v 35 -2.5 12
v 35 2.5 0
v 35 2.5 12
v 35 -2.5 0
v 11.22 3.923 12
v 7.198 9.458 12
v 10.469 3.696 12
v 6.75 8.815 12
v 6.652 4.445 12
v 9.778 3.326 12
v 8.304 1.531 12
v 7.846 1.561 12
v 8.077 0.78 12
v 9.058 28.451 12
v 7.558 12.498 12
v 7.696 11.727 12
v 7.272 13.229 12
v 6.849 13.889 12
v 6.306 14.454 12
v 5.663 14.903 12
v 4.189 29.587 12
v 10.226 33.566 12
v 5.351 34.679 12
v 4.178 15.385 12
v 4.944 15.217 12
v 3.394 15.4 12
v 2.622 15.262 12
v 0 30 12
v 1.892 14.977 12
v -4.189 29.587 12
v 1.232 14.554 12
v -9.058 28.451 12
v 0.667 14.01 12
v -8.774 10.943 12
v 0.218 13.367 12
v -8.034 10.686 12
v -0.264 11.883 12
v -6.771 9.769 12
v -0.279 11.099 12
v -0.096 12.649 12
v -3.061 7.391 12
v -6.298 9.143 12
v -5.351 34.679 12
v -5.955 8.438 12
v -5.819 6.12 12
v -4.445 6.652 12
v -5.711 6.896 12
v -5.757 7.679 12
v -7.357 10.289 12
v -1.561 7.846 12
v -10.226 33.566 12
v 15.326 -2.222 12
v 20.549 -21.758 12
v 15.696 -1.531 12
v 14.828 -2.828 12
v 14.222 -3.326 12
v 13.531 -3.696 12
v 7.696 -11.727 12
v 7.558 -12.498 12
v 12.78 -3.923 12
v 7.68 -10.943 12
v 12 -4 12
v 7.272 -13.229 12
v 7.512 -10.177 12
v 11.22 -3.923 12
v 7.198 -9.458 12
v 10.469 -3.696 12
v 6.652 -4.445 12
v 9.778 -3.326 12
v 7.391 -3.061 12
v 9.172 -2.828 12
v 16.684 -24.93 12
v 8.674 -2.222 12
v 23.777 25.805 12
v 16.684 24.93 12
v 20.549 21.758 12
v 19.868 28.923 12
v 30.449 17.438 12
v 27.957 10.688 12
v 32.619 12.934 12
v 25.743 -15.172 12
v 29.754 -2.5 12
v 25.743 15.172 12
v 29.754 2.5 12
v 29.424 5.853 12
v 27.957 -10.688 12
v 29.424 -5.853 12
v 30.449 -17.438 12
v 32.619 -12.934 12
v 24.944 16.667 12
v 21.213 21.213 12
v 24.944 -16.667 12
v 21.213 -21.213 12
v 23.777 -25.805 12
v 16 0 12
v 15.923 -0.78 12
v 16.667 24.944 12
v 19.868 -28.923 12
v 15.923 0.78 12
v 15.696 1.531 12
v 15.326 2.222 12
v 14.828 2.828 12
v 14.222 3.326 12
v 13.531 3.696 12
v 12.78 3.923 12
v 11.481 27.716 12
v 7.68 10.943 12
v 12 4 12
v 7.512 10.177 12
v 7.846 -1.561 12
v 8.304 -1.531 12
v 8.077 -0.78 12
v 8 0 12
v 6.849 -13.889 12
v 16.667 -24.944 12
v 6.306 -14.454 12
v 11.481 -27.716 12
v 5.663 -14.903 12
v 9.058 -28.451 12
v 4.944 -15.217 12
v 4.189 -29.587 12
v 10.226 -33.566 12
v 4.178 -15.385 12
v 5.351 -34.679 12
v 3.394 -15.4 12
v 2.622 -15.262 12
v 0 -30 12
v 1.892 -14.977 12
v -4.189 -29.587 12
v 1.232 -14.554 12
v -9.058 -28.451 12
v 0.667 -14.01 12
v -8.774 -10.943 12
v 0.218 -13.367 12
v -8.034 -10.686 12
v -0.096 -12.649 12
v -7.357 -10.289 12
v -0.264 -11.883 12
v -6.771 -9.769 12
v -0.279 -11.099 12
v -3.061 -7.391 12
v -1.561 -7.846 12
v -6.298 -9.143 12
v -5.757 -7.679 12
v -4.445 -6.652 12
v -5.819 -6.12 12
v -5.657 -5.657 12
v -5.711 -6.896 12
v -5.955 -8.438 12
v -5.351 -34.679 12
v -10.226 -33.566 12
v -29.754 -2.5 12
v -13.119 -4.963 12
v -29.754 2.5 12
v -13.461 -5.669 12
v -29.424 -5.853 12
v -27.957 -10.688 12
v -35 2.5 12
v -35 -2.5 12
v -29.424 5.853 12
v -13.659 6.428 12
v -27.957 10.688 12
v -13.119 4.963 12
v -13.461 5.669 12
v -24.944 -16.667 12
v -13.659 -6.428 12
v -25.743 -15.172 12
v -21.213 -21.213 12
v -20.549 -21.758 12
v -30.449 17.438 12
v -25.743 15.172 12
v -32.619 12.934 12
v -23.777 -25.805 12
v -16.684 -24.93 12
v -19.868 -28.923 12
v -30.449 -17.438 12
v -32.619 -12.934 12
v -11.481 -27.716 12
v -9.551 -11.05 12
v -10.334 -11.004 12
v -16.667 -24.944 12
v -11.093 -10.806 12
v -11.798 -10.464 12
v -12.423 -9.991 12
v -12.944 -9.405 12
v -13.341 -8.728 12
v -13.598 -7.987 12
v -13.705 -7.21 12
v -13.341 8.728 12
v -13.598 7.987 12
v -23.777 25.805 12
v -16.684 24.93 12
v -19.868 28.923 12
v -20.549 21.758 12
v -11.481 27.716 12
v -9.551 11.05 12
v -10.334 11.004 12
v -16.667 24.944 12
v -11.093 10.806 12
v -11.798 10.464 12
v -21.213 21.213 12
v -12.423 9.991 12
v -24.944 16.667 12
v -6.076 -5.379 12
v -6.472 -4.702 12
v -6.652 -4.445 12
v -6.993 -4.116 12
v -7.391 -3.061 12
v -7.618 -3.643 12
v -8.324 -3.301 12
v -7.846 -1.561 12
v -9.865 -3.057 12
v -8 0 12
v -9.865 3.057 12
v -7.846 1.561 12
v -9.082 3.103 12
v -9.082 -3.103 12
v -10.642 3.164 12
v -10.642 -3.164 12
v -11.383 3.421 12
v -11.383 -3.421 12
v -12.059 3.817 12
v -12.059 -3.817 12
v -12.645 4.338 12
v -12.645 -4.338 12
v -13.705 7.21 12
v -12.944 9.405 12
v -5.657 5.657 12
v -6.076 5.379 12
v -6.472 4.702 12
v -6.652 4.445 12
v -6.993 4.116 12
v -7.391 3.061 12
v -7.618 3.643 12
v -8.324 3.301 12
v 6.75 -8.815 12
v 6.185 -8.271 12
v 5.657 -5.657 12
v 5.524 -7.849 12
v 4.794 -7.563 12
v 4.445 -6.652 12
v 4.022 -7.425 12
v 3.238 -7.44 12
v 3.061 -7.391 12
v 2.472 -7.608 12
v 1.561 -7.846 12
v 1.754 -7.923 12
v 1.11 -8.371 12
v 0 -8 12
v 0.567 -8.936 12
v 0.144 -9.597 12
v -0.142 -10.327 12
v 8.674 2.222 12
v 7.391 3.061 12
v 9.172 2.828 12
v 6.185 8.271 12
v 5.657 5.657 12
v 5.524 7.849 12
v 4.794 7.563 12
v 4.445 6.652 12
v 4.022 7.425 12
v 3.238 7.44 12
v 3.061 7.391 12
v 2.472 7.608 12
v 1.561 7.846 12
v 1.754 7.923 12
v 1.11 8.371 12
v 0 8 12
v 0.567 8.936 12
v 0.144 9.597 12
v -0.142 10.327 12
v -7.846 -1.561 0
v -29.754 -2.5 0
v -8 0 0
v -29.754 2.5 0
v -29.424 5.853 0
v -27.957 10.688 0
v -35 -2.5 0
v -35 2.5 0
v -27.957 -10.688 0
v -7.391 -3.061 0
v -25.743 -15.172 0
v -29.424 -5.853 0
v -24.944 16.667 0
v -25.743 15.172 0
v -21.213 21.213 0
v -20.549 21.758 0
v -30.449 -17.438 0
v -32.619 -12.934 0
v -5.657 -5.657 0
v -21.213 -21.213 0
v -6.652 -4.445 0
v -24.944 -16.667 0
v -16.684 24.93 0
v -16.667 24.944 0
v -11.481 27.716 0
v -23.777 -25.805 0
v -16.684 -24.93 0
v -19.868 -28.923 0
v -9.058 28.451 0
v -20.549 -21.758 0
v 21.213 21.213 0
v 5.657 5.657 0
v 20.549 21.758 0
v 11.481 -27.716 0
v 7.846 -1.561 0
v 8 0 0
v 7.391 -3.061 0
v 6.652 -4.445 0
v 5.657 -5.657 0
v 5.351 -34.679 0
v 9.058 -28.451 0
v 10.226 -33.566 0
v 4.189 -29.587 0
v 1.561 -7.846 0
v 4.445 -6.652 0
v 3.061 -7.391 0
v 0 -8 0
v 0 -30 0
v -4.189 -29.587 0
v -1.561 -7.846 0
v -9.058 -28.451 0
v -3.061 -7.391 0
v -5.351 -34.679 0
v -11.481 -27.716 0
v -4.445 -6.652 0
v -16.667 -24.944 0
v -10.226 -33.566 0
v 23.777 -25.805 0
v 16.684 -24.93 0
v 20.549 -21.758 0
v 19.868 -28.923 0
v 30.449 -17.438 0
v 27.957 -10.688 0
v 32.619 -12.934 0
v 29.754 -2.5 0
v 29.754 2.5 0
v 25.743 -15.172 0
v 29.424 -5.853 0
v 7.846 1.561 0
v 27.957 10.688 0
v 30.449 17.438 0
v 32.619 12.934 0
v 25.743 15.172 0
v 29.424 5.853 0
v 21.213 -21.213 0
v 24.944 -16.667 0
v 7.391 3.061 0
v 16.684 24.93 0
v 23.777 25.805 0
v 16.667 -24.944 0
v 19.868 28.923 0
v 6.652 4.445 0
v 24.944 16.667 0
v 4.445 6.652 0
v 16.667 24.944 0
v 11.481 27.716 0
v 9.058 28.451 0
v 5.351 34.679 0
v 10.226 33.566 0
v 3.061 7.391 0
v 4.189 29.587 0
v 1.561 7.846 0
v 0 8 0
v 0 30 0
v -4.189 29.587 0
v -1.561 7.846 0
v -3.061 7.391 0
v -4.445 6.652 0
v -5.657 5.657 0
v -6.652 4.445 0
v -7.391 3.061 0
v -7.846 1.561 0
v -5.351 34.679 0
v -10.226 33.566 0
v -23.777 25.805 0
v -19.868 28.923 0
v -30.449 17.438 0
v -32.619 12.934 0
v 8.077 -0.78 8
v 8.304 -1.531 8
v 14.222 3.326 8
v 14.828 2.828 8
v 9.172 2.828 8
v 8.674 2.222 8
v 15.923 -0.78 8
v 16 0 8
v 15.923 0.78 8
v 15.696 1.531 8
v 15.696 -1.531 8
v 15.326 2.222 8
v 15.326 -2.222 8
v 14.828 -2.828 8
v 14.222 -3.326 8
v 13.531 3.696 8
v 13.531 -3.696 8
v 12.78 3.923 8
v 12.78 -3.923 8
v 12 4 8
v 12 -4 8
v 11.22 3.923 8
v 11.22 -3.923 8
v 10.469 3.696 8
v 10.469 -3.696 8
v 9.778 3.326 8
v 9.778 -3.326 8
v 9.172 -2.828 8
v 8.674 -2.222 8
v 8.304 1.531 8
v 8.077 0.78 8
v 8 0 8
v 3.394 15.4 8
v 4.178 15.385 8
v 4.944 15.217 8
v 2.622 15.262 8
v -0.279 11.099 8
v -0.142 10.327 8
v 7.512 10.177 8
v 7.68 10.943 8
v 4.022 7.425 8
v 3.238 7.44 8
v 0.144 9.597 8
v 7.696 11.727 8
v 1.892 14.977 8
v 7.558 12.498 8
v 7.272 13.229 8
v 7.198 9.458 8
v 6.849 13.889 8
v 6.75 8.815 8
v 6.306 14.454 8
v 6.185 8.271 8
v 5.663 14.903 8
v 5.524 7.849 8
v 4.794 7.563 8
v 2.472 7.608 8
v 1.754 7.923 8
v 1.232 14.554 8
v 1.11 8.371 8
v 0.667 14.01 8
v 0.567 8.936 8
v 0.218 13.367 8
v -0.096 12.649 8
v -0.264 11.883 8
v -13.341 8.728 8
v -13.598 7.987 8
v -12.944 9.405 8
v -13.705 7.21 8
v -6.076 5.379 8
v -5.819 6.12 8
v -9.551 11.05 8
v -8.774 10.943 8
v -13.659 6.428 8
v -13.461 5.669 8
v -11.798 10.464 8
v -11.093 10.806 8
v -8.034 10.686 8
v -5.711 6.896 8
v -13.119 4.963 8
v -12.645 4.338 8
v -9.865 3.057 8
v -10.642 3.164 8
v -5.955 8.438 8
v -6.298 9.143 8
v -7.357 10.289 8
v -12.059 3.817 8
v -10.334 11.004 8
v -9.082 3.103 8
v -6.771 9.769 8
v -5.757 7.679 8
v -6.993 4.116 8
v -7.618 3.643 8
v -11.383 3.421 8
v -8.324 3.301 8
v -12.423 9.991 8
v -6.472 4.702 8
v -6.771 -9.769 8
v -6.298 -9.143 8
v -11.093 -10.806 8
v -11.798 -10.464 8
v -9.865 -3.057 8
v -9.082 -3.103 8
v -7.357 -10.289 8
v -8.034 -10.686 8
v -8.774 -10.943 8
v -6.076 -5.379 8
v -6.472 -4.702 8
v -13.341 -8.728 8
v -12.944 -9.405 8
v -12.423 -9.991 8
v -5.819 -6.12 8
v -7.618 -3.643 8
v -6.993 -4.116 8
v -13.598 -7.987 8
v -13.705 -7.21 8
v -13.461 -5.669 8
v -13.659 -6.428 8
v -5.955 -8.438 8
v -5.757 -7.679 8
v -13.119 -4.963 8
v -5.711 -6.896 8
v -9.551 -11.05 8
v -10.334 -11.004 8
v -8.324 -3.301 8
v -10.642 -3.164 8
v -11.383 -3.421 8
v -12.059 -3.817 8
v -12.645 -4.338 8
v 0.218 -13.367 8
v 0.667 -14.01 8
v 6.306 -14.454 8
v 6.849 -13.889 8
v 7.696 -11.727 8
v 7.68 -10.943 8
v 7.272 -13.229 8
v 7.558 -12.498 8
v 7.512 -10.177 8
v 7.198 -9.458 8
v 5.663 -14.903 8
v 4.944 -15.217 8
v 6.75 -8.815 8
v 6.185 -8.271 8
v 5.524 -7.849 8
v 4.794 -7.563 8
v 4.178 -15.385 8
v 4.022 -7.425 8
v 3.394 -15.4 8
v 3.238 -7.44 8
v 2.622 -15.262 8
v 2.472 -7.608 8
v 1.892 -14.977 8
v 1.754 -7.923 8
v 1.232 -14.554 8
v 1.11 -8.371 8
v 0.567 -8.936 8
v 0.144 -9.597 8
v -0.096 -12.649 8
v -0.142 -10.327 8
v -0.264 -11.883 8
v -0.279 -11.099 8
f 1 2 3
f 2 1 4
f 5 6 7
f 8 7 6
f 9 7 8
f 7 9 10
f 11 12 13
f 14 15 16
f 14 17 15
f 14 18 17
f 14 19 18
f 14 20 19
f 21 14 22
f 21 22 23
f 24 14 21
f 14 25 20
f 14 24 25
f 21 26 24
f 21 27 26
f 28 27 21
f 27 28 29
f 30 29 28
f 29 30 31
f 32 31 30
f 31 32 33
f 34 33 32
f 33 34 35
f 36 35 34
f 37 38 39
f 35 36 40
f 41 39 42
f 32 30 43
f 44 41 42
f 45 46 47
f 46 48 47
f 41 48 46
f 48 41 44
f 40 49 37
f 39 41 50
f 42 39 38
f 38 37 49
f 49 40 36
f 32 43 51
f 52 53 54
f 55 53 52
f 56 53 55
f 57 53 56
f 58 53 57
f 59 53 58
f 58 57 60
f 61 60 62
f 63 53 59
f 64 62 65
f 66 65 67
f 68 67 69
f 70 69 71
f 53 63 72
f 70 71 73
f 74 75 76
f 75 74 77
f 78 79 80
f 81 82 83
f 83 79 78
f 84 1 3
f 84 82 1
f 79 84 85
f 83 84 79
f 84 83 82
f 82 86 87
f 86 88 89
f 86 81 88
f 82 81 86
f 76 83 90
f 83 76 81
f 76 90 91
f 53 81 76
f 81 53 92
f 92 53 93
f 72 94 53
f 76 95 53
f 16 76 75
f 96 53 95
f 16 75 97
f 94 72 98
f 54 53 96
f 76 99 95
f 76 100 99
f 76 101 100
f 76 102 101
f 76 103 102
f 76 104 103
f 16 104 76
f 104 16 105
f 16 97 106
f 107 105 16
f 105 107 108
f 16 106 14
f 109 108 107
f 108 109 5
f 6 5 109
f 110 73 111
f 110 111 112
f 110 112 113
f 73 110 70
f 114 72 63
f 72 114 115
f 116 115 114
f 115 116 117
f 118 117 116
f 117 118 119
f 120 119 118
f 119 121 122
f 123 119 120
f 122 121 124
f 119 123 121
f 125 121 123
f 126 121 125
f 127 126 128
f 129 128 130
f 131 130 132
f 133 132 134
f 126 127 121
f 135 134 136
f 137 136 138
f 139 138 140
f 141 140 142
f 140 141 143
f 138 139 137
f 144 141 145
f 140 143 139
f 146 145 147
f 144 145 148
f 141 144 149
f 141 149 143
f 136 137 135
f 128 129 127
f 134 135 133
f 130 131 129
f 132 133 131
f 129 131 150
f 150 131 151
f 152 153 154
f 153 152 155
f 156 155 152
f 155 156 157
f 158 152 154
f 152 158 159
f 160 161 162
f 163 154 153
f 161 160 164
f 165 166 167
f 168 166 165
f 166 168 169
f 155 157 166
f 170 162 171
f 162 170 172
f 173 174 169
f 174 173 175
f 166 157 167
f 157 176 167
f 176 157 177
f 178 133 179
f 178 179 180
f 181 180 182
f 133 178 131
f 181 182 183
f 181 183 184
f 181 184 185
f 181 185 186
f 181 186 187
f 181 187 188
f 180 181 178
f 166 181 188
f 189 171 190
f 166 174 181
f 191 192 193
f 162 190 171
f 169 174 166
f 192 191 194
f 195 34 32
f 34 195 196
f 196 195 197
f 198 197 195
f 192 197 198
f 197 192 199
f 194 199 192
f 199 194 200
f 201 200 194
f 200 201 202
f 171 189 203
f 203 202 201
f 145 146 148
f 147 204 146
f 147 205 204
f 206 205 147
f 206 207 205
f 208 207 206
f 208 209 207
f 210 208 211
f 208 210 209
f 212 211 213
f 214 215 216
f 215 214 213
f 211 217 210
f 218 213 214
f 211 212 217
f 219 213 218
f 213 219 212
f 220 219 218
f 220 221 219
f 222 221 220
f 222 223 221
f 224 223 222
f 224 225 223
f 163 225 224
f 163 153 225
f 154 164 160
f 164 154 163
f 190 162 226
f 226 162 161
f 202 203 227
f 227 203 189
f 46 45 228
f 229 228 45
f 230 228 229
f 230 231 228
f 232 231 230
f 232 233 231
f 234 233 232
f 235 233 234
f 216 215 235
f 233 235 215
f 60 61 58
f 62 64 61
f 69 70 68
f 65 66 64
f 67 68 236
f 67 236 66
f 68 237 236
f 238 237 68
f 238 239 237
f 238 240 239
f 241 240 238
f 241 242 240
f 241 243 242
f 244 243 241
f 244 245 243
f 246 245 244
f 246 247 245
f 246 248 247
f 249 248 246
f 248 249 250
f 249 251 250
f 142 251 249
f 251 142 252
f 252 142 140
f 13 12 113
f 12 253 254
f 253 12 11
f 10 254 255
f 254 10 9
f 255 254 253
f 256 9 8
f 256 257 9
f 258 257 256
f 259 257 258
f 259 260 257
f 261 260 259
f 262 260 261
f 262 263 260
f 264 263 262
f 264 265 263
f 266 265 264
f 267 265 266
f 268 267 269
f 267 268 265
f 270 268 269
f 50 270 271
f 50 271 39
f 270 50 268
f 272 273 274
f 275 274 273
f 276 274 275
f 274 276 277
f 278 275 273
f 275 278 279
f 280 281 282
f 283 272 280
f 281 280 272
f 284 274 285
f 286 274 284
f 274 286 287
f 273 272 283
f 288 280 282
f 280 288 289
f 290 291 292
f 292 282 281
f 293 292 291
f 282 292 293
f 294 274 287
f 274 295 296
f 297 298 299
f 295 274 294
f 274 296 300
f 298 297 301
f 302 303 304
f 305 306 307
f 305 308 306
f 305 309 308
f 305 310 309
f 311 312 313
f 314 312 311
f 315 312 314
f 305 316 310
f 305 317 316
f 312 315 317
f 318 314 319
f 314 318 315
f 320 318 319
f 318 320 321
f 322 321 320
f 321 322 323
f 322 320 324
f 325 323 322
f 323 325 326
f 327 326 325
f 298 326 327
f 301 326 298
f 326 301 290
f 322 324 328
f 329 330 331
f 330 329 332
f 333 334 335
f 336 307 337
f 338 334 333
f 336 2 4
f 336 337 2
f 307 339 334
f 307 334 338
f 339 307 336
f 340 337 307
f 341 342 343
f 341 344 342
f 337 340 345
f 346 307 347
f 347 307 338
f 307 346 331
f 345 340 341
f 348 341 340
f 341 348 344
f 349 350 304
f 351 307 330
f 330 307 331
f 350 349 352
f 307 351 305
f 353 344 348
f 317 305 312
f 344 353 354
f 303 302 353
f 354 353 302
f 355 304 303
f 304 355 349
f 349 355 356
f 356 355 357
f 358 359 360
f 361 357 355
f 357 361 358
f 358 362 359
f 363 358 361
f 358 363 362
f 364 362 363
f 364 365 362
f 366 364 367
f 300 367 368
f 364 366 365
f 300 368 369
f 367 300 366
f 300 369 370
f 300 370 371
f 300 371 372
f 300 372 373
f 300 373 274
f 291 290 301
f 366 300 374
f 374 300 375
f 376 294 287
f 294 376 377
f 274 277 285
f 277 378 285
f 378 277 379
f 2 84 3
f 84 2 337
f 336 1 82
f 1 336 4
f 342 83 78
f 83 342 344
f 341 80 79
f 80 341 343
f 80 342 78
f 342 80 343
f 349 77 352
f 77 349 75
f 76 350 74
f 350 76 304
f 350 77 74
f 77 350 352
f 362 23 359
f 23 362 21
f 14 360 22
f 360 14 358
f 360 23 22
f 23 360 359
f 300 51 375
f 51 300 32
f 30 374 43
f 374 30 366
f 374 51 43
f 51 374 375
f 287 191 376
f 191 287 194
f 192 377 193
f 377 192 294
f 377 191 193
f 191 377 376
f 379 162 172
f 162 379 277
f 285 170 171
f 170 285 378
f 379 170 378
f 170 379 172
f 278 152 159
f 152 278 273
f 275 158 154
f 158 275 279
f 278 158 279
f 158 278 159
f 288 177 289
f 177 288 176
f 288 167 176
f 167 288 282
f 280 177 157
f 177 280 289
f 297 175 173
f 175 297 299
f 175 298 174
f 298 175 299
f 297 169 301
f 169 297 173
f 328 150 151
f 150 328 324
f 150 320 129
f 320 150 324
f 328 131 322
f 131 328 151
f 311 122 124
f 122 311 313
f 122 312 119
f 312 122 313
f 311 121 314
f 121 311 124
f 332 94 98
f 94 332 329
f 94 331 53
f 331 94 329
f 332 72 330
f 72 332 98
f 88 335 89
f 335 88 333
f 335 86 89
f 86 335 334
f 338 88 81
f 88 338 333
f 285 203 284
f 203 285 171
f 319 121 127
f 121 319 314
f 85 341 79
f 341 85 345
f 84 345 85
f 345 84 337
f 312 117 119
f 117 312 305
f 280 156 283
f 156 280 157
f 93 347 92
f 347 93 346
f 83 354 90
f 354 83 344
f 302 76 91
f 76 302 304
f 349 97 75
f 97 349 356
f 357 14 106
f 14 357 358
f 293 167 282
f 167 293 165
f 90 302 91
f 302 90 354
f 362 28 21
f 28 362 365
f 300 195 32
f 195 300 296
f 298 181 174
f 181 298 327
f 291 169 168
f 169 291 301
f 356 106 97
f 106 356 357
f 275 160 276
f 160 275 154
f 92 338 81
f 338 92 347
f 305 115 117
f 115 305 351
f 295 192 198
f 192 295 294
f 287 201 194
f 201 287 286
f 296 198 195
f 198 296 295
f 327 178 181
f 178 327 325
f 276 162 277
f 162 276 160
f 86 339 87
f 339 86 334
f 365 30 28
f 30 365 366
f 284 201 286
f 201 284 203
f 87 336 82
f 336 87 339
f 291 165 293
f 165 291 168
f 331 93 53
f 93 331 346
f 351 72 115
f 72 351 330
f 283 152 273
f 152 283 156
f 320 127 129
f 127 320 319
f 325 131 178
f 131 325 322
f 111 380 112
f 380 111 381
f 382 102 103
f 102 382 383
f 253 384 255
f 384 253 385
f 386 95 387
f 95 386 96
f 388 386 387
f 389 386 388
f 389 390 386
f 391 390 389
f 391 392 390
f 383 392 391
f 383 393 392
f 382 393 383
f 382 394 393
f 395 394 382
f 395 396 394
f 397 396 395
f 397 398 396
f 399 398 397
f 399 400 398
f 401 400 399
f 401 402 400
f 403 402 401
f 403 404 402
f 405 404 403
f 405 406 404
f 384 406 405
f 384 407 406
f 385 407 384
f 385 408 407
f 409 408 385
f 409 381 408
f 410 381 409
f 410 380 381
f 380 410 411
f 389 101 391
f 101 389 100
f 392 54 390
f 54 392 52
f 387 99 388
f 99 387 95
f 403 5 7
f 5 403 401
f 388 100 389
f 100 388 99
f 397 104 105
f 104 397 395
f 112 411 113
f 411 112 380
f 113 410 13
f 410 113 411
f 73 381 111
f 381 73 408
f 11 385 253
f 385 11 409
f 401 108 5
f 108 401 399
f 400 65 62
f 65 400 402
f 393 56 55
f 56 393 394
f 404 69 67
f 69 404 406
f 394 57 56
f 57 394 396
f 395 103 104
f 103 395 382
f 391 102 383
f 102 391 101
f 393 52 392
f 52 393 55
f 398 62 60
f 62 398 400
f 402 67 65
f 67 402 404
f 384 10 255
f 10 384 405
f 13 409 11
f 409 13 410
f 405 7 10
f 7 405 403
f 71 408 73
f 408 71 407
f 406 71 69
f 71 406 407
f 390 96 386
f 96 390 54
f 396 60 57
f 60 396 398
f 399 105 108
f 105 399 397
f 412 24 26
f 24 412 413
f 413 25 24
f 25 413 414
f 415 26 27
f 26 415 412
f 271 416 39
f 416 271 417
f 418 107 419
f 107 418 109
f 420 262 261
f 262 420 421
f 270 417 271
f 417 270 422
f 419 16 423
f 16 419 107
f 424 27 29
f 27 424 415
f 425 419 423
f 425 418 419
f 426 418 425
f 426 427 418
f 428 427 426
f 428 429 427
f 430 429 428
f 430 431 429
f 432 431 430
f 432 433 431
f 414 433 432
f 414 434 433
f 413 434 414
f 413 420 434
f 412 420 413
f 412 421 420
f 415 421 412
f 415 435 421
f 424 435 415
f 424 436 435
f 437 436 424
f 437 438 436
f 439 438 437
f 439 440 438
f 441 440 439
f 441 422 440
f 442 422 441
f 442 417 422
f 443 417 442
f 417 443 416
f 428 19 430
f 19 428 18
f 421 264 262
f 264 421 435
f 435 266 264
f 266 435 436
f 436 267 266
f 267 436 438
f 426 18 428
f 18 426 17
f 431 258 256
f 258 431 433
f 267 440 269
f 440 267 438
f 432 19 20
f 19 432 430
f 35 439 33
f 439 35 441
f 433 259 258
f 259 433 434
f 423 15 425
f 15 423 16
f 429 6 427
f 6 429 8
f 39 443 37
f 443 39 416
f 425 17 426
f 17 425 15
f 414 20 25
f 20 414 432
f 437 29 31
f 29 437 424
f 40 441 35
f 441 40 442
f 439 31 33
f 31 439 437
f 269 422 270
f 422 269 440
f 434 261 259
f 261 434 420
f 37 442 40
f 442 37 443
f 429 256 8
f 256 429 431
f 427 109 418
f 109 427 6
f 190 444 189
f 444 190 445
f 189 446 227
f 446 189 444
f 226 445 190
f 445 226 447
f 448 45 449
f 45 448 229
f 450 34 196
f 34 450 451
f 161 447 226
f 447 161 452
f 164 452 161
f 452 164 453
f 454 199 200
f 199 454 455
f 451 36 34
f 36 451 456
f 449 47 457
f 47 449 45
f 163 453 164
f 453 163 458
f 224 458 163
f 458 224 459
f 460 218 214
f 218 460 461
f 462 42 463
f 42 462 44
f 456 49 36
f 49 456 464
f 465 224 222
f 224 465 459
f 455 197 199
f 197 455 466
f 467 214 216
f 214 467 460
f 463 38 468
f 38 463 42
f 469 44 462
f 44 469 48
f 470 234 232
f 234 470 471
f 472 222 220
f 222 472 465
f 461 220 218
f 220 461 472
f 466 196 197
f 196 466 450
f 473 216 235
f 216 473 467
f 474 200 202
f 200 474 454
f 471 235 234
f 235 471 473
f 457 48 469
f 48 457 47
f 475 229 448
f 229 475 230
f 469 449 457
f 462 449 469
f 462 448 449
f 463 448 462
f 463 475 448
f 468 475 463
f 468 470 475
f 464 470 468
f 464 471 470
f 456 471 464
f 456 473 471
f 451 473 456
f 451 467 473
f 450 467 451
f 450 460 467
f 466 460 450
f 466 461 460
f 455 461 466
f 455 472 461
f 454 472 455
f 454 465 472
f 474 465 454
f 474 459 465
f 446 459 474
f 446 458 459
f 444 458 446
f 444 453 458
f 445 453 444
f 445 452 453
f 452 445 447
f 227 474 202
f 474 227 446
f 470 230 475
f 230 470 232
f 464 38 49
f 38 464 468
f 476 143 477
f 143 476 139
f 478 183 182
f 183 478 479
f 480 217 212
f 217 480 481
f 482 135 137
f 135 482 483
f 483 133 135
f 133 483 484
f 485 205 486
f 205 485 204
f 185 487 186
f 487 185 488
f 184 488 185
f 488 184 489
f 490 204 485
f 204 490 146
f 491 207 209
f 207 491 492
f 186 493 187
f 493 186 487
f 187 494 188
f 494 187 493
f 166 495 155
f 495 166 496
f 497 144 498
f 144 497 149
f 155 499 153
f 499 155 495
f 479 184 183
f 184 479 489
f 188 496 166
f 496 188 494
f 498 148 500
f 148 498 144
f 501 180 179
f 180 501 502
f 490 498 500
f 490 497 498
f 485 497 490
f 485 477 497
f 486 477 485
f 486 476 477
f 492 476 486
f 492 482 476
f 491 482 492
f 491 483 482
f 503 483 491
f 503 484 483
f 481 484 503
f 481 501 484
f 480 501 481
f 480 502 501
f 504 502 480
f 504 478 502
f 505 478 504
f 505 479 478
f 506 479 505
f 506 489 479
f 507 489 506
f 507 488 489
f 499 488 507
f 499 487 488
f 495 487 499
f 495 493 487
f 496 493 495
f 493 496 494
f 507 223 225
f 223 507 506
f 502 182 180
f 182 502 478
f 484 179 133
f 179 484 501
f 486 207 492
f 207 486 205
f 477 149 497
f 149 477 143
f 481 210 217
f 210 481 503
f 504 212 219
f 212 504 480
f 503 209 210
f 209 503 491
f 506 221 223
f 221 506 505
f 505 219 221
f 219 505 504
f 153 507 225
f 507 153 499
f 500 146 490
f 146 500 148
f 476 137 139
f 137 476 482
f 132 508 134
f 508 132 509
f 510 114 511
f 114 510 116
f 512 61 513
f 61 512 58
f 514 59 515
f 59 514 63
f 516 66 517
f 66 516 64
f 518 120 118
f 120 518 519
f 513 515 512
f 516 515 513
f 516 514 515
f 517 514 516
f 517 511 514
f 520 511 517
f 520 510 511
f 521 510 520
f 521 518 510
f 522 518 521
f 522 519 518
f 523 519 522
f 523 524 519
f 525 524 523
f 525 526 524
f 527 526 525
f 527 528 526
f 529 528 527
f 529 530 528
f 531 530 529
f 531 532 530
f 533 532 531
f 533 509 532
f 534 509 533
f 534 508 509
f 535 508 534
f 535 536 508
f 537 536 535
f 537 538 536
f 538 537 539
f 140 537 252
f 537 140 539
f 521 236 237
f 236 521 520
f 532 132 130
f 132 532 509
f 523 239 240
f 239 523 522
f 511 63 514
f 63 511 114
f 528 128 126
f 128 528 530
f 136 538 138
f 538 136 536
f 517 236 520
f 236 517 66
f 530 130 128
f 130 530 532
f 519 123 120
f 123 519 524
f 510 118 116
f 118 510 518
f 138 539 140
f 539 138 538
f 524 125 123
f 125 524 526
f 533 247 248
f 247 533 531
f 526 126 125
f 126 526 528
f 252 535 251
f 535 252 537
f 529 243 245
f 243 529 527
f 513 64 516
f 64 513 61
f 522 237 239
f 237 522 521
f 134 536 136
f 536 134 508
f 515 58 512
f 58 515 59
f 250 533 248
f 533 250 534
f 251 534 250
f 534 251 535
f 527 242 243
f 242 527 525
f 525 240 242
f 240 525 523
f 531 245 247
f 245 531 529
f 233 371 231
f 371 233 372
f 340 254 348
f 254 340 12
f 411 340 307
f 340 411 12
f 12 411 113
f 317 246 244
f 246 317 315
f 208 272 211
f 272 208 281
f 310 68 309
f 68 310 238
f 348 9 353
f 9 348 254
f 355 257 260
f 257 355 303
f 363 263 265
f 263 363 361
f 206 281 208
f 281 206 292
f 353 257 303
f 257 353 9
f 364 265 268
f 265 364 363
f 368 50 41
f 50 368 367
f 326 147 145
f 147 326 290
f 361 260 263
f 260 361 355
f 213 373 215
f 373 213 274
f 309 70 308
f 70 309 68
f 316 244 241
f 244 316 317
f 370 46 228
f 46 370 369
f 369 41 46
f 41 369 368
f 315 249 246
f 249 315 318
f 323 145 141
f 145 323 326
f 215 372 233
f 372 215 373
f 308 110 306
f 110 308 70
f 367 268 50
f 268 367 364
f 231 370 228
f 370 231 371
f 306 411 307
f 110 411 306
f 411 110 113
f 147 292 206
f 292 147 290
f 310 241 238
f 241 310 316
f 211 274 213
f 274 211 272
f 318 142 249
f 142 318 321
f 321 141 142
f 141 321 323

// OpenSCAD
$fn = 32;

// ----------------------------------------------------------------------
// Spur blank: lightened gear blank
// ----------------------------------------------------------------------

// --- parameters (mm) ---
disc_r = 30;              // blank root radius
disc_t = 12;              // blank thickness
n_teeth = 14;             // stub tooth count
tooth_w = 5;              // tooth width at the root
tooth_h = 5;              // tooth height above the root
bore_r = 8;               // central bore radius
ring_r = 12;              // lightening pocket ring radius
pocket_r = 4;             // lightening pocket radius

out_r = disc_r + tooth_h;  // tip radius
bbox_x = 70.0;  // measured width over the teeth
bbox_y = 69.36;  // measured depth over the teeth

difference() {
union() {
  cylinder(r = disc_r, h = disc_t);
  for (i = [0 : n_teeth - 1])
    rotate([0, 0, i * 360 / n_teeth])
      translate([disc_r - 1, -tooth_w / 2, 0])
        cube([tooth_h + 1, tooth_w, disc_t]);
}
  translate([0, 0, -1]) cylinder(r = bore_r, h = disc_t + 2);
  for (i = [0 : 5])
    rotate([0, 0, i * 72])
      translate([ring_r, 0, disc_t - 4])
        cylinder(r = pocket_r, h = 5);
}
